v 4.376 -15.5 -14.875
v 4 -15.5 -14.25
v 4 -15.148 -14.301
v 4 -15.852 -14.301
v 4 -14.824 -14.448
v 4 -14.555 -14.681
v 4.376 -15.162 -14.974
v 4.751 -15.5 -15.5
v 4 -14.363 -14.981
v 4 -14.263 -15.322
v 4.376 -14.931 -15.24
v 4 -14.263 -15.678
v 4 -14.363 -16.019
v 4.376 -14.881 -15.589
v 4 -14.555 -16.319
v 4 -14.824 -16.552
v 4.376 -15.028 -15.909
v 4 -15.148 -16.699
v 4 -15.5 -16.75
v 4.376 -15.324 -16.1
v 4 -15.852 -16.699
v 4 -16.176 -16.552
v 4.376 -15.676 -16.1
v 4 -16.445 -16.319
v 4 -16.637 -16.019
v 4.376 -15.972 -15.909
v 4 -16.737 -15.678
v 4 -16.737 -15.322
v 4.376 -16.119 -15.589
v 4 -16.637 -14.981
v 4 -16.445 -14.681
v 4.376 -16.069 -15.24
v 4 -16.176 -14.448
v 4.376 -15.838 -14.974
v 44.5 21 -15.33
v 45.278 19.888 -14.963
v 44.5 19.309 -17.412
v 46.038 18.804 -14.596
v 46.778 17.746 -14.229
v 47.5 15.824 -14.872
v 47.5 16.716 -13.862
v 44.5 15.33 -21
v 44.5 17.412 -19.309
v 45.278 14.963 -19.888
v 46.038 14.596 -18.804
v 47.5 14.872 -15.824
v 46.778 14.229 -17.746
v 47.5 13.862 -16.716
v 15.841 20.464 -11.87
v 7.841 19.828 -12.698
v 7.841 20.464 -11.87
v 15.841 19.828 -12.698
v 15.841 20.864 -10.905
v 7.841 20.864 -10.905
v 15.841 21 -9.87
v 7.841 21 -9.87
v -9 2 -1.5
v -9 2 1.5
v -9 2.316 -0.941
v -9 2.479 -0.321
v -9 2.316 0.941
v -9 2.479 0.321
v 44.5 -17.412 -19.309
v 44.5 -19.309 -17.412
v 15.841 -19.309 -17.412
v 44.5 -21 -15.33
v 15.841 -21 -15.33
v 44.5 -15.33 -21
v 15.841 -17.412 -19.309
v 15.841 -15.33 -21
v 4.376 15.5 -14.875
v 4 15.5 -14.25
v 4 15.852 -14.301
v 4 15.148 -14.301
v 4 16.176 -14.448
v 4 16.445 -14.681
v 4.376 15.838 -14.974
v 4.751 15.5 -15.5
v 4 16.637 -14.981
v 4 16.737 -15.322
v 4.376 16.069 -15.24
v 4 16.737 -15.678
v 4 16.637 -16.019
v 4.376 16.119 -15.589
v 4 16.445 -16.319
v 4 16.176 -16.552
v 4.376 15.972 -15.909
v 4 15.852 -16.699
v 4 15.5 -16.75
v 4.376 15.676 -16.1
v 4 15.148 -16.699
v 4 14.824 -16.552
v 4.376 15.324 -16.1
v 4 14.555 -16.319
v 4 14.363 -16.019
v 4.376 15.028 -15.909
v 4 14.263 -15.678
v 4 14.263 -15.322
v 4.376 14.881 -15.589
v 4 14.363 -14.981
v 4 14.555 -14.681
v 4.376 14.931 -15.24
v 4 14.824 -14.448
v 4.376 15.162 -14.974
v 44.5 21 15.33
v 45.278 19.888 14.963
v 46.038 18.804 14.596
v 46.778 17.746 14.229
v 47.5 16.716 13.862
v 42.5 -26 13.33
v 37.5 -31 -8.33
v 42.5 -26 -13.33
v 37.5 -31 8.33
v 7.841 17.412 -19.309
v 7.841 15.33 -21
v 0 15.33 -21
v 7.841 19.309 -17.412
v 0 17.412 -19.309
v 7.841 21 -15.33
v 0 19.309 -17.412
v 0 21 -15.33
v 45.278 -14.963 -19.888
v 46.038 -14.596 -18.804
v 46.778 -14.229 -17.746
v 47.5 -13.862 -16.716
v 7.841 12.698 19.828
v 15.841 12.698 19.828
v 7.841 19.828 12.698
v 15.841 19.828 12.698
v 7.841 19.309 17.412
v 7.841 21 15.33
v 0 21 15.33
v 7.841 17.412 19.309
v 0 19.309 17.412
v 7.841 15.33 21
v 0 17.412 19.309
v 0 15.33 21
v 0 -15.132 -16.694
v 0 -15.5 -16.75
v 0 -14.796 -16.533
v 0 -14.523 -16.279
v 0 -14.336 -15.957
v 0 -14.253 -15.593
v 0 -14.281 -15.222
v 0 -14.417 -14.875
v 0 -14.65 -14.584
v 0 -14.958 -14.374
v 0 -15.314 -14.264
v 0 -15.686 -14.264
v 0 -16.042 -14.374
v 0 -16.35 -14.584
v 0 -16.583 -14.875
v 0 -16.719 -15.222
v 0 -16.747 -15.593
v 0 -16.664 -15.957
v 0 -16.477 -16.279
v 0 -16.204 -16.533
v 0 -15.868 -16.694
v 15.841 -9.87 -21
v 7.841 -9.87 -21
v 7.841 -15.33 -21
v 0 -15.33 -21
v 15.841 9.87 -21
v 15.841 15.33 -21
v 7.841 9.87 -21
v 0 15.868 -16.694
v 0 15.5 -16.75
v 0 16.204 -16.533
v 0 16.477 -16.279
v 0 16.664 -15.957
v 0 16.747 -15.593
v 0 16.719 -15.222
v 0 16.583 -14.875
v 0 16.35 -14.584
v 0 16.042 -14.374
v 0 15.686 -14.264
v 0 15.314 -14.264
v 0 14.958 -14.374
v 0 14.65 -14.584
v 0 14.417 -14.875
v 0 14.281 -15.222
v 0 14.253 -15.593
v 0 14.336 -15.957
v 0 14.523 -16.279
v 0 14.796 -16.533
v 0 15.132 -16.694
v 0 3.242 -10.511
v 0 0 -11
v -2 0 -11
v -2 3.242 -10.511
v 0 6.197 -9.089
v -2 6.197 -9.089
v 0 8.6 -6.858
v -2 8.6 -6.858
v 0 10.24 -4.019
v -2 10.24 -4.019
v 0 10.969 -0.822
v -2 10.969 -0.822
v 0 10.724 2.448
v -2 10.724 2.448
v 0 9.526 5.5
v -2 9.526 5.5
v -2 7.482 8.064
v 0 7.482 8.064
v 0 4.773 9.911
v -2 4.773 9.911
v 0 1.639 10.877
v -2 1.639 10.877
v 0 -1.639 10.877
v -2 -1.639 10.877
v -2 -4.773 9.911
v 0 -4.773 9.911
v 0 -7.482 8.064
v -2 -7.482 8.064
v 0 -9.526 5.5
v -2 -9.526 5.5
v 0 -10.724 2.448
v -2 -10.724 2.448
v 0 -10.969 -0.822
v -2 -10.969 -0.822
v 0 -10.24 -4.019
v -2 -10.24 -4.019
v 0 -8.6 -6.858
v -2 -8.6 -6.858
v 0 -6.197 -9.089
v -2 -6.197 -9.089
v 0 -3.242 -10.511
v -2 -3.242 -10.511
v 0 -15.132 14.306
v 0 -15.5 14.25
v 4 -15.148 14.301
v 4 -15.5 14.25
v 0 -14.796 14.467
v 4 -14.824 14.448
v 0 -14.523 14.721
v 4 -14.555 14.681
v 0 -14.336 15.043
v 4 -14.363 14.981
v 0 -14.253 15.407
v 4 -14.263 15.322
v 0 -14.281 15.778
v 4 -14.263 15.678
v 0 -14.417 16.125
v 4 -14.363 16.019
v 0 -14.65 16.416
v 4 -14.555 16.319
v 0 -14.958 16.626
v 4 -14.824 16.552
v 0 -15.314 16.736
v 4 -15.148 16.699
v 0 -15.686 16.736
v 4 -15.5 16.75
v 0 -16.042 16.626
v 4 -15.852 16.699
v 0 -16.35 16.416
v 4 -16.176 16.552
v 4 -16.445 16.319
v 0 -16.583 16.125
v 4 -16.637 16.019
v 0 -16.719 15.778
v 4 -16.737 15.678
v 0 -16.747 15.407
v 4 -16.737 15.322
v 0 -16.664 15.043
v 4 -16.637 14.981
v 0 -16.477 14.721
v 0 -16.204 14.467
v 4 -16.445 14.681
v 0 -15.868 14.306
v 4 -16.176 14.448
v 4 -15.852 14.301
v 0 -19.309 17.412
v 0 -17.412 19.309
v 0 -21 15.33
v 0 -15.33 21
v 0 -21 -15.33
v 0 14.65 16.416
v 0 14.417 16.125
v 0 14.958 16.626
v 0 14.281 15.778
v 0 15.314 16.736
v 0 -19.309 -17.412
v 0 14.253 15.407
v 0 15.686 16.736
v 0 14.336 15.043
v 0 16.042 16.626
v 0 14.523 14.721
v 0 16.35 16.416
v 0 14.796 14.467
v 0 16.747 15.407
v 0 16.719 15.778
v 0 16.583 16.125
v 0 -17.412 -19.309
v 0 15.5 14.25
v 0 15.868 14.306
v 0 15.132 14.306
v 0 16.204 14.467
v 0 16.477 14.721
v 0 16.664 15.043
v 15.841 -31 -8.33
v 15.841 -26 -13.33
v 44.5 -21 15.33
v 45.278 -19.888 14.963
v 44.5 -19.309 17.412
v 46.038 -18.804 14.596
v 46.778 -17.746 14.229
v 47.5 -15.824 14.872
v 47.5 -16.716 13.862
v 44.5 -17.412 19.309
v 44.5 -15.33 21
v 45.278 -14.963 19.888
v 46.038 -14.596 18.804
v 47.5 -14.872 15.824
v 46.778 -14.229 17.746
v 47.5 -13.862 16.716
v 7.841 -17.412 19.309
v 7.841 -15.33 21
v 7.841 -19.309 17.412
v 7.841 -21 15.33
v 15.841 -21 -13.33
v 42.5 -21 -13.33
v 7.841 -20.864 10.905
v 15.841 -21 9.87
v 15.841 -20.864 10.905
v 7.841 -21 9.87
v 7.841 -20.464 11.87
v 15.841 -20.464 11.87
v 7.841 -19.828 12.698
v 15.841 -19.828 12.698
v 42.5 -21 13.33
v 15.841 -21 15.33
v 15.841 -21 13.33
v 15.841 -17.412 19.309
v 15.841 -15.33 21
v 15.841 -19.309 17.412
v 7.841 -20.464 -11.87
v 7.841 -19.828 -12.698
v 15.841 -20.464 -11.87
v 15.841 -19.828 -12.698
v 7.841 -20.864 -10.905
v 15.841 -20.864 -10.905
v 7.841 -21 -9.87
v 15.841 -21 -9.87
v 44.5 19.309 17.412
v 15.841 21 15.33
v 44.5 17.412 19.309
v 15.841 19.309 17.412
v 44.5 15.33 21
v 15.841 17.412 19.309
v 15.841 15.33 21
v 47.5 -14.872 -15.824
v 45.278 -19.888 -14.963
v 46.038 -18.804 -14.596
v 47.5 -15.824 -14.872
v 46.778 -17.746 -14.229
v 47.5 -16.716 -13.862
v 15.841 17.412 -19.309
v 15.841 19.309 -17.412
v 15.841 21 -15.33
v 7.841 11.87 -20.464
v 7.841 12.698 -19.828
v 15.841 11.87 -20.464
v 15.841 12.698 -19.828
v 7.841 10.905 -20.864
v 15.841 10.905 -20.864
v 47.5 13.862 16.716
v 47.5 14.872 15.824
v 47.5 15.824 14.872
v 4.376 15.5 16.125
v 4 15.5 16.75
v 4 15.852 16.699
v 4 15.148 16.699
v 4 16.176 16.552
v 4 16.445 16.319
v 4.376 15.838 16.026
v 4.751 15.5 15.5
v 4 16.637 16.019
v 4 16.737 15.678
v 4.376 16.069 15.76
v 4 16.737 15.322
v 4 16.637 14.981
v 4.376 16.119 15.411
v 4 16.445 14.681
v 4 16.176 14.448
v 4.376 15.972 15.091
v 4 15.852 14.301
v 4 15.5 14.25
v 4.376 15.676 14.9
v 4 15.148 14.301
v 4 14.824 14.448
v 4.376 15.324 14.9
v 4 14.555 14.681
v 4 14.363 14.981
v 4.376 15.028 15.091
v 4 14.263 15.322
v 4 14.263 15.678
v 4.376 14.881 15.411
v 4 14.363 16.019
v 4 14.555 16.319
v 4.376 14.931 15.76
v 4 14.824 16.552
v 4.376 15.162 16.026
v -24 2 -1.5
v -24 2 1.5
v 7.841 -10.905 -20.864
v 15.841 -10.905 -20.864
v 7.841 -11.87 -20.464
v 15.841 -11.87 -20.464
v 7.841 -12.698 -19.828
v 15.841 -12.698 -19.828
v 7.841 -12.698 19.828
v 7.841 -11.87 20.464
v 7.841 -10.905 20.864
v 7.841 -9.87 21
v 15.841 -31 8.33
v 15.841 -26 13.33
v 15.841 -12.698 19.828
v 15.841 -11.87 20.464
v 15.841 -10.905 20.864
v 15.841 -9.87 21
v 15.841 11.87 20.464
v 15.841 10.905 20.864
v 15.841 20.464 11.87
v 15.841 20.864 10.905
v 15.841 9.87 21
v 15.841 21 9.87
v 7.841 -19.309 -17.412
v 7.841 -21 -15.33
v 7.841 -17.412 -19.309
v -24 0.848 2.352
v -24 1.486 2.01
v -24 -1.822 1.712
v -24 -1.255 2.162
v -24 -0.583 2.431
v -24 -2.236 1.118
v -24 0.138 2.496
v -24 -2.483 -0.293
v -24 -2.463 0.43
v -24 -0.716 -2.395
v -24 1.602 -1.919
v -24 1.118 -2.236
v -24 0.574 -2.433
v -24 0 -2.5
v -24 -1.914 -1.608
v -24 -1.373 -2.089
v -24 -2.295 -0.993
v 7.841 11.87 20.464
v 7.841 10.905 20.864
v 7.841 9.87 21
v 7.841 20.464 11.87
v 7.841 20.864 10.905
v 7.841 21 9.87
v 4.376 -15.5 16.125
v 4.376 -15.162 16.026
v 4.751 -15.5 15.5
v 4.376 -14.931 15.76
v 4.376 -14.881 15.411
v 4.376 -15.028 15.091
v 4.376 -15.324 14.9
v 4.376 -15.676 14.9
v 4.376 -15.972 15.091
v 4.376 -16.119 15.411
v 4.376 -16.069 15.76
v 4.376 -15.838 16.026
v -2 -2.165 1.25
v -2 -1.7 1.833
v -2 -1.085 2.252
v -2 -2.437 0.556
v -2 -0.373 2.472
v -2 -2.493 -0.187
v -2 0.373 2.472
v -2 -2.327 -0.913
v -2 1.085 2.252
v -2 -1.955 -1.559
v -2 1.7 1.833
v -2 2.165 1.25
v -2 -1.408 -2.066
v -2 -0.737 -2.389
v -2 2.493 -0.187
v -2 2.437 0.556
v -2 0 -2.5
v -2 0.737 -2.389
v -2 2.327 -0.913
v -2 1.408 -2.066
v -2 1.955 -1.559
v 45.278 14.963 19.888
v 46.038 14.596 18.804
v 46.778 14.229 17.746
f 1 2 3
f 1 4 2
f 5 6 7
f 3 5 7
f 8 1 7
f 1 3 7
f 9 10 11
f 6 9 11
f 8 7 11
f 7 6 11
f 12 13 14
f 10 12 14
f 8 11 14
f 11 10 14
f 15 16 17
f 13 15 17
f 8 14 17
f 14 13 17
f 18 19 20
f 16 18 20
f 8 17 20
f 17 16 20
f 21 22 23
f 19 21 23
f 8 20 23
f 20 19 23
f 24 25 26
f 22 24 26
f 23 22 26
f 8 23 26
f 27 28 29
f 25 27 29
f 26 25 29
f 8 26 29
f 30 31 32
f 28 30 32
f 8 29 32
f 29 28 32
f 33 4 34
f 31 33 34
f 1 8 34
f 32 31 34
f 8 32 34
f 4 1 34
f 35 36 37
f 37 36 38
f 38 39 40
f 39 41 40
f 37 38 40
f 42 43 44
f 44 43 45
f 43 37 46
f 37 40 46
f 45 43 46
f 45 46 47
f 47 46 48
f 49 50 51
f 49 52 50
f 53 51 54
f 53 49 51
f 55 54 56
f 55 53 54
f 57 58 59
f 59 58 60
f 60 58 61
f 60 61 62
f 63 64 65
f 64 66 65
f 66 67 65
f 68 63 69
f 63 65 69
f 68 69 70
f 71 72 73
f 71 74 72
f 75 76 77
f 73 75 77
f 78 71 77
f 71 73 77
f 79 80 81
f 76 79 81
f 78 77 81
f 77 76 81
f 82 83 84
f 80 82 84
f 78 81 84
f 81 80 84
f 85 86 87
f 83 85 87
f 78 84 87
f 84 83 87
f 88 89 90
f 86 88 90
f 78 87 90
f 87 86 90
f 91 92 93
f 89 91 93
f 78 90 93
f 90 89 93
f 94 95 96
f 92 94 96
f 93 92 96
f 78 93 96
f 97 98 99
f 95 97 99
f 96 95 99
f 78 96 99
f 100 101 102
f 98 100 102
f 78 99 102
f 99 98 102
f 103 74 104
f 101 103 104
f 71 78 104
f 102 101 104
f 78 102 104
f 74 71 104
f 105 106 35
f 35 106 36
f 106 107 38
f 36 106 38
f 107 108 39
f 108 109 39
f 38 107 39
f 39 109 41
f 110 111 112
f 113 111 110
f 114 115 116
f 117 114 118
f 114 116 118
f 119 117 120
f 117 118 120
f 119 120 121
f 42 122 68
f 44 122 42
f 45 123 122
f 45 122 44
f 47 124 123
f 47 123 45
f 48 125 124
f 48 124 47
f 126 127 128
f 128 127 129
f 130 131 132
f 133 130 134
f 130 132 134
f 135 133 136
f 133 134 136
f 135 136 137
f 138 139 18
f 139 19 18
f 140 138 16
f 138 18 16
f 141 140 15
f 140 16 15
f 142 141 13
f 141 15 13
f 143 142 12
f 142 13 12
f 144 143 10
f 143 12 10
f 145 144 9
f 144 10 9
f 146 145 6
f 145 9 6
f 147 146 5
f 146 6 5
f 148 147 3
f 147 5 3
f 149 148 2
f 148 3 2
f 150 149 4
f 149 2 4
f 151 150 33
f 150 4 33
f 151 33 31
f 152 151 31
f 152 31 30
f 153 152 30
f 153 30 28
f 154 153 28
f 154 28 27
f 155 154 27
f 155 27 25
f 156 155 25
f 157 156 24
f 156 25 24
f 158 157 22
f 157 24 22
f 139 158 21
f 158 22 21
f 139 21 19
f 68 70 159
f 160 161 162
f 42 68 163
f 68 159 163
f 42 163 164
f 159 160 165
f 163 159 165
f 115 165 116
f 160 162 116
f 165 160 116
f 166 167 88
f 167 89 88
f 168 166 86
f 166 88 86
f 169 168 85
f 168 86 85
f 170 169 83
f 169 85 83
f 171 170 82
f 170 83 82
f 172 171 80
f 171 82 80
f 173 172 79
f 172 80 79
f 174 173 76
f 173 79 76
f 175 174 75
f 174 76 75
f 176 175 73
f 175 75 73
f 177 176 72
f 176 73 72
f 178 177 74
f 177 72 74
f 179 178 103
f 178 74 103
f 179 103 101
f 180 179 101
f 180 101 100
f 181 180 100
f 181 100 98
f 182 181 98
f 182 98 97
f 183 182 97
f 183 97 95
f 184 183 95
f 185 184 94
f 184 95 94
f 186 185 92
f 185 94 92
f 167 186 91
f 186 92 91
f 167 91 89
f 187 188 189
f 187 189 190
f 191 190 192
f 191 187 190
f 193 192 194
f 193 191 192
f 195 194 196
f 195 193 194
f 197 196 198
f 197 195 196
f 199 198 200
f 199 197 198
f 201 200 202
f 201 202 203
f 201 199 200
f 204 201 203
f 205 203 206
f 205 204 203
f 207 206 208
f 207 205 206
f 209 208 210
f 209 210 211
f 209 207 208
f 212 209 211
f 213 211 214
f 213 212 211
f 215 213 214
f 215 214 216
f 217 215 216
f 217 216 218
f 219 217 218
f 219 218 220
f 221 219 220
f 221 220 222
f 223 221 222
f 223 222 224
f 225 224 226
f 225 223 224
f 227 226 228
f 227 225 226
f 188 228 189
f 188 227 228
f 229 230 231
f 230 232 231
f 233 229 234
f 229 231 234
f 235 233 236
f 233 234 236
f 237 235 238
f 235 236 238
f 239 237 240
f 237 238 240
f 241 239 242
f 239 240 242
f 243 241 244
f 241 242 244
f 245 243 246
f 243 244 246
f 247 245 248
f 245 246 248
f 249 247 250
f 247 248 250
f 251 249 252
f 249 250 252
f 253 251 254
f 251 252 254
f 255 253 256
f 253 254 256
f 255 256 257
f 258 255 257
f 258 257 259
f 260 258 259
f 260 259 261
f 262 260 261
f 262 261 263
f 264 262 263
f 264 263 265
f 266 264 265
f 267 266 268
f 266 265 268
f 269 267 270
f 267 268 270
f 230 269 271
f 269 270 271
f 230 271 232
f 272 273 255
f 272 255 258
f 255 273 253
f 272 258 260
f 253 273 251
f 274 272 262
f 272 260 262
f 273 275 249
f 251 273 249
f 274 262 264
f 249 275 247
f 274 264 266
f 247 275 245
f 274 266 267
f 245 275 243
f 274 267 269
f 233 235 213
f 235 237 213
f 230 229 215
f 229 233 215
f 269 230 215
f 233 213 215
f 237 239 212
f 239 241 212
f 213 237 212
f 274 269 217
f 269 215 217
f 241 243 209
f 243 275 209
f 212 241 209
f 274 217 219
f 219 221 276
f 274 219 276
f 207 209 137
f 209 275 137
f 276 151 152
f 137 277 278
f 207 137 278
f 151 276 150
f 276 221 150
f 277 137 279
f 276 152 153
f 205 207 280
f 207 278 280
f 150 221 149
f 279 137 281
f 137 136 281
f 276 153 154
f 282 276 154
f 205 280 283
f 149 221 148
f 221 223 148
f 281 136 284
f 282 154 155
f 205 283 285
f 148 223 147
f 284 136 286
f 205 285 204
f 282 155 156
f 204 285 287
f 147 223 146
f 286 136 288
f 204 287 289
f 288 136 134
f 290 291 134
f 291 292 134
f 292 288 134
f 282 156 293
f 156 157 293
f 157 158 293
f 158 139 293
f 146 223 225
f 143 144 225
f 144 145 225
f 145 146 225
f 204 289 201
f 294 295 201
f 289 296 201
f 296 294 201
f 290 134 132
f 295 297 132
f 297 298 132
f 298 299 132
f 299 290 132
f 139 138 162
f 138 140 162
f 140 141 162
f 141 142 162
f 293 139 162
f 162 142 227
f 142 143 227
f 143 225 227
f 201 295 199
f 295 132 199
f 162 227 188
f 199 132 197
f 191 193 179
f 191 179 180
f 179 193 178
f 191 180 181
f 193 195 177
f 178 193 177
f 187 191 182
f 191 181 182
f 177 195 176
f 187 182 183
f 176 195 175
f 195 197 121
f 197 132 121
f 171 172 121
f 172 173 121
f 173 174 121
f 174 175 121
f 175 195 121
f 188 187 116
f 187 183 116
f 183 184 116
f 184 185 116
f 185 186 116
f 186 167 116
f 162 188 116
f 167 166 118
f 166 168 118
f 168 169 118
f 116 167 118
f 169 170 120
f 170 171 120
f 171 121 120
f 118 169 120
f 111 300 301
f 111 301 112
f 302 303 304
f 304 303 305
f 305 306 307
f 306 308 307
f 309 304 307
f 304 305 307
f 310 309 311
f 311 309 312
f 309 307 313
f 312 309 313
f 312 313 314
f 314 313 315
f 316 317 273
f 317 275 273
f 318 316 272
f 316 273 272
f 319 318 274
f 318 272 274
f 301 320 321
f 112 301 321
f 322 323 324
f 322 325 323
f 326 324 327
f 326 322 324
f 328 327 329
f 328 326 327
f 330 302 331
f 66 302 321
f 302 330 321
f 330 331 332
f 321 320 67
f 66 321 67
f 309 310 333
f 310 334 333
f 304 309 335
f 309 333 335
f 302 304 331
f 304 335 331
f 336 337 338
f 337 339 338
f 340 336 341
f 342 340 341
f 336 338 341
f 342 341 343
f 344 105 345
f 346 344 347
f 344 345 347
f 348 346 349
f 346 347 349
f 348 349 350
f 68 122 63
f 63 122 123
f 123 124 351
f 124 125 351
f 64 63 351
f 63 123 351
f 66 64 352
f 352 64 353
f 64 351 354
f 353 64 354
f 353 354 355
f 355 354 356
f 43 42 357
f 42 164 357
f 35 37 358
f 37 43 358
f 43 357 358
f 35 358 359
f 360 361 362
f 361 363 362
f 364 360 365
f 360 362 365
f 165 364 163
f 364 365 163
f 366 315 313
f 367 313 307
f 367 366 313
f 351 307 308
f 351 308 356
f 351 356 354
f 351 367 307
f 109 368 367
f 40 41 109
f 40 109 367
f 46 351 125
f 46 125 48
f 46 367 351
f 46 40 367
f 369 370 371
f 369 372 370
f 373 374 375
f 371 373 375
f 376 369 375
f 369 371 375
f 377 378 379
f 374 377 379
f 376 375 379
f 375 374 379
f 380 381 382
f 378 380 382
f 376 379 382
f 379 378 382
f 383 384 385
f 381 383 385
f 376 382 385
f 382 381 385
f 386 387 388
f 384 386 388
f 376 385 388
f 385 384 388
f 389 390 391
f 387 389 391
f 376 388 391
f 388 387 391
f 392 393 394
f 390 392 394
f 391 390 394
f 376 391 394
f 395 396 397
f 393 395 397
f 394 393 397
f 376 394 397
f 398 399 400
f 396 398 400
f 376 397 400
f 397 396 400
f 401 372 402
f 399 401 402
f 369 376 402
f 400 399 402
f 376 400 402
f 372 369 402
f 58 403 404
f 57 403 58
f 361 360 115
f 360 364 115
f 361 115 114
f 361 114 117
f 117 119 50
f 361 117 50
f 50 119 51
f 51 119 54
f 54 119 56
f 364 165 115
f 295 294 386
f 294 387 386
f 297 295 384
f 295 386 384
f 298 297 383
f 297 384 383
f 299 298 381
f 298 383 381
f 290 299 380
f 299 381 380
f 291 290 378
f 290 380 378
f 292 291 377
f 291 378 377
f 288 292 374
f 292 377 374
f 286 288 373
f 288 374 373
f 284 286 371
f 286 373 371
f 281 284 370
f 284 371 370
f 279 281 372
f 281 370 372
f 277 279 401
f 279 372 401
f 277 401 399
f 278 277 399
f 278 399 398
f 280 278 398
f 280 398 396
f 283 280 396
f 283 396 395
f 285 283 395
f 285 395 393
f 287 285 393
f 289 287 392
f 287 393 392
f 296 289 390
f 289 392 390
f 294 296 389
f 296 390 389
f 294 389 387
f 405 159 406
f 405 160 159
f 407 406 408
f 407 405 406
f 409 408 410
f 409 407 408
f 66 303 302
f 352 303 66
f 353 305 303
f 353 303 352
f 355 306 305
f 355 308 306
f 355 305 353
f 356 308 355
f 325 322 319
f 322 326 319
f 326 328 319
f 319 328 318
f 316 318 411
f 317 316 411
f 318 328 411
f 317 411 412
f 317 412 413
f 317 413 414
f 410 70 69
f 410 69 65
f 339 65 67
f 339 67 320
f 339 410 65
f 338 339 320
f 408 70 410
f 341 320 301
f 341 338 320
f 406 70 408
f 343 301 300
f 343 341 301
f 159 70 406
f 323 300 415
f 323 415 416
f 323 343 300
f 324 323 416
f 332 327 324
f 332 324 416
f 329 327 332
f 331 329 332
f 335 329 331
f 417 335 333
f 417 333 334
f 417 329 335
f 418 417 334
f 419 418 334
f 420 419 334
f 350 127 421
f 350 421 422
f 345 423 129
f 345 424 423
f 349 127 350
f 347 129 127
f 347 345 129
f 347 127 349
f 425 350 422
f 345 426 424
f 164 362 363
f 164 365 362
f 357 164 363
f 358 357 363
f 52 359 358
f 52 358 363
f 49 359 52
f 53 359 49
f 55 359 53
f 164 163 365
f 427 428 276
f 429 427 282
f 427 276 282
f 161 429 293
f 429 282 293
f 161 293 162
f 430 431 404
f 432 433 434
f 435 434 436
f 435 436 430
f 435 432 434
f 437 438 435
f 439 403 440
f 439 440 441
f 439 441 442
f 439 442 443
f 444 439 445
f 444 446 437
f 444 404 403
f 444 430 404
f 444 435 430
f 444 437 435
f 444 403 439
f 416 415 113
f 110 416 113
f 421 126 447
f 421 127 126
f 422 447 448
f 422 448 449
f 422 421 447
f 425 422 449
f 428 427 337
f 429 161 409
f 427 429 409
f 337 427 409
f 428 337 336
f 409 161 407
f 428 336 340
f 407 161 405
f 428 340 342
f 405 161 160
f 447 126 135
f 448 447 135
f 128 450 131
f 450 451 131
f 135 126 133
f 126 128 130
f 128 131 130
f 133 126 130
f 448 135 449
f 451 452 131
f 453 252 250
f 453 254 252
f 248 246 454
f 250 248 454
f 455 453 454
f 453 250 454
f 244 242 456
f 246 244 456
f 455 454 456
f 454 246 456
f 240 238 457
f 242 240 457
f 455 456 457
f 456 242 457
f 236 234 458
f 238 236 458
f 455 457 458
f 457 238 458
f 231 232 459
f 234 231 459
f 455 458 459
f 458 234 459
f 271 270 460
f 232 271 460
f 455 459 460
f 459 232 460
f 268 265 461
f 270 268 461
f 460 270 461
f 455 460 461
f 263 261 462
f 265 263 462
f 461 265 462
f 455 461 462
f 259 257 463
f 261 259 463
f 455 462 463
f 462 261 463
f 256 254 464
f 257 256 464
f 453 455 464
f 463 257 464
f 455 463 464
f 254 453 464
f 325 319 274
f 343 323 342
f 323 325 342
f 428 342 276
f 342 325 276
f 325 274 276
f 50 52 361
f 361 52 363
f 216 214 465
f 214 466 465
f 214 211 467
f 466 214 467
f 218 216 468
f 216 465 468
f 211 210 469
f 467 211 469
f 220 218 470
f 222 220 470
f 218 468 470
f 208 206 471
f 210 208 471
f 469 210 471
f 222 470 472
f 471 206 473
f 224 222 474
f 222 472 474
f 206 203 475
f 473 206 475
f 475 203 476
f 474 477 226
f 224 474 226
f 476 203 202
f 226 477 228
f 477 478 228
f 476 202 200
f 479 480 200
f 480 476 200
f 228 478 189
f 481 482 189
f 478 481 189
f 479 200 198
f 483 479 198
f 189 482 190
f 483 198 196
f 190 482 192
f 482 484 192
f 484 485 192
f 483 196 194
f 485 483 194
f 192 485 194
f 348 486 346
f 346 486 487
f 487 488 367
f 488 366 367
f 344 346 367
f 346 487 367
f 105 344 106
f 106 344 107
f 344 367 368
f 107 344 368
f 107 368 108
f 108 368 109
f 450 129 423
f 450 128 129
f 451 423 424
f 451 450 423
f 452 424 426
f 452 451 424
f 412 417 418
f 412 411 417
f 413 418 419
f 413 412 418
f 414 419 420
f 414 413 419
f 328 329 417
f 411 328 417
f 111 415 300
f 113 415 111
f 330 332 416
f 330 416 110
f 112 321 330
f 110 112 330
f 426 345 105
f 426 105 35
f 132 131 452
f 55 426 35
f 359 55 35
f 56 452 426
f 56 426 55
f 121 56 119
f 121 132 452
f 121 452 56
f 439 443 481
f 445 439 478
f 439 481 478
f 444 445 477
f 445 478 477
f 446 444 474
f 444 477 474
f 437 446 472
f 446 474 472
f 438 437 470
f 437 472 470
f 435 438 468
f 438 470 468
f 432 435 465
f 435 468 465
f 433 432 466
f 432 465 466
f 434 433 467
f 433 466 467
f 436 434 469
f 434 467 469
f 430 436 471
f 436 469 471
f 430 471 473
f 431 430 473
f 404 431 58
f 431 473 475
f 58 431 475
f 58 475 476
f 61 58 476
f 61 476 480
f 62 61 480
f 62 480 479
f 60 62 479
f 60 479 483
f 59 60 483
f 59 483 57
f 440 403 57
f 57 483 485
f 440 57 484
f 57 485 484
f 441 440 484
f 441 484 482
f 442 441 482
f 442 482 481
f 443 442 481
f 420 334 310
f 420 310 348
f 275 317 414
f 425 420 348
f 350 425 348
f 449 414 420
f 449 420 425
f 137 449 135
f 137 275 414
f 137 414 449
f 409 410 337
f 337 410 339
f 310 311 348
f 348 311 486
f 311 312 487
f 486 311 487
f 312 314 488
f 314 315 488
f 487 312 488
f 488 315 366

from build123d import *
from OCP.BRepFilletAPI import BRepFilletAPI_MakeChamfer

# Parameters (mm, degrees)
ESQUISSE1_W                  = 42
ESQUISSE1_H                  = 42
BOSS_EXTRU_1_DEPTH           = 47.5
ESQUISSE2_R                  = 11
BOSS_EXTRU_2_DEPTH           = 2
ESQUISSE3_R                  = 2.5
BOSS_EXTRU_3_DEPTH           = 24
TROU_TARAUD_M31_D            = 2.5
TROU_TARAUD_M31_DEPTH        = 4
TROU_TARAUD_M31_TIP          = 0.751075774
ESQUISSE6_OUTSIDE_W          = 62.59
ESQUISSE6_OUTSIDE_H          = 62.59
ESQUISSE6_OUTSIDE_R          = 26
ENL_V_MAT_EXTRU_1_DEPTH      = 57.020085684
ENL_V_MAT_EXTRU_2_DEPTH      = 57.020085684
ENL_V_MAT_EXTRU_2_DEPTH_BACK = 57.020085684
CHANFREIN1_SIZE              = 3
CHANFREIN1_SIZE2             = 4.28444402
ESQUISSE10_W                 = 26.659419434
ESQUISSE10_H                 = 26.659419434
BOSS_EXTRU_5_DEPTH           = 10
CHANFREIN2_SIZE              = 5
ESQUISSE11_OUTSIDE_W         = 63.576
ESQUISSE11_OUTSIDE_H         = 73.576
ENL_V_MAT_EXTRU_3_DEPTH      = 8
CONG_1_R                     = 4


with BuildPart() as part:
    # Esquisse1 → Boss.-Extru.1 (new body)
    with BuildSketch(Plane(origin=(0, 0, 0), x_dir=(0, 0, -1), z_dir=(1, 0, 0))):
        Rectangle(ESQUISSE1_W, ESQUISSE1_H)
    extrude(amount=BOSS_EXTRU_1_DEPTH)

    # Esquisse2 → Boss.-Extru.2 (add)
    with BuildSketch(Plane(origin=(0, 0, 0), x_dir=(0, 0, -1), z_dir=(1, 0, 0))):
        Circle(ESQUISSE2_R)
    extrude(amount=-BOSS_EXTRU_2_DEPTH)

    # Esquisse3 → Boss.-Extru.3 (add)
    with BuildSketch(Plane.ZY):
        with Locations(Location((0, 0, 0), (0, 0, 180))):
            Circle(ESQUISSE3_R)
    extrude(amount=BOSS_EXTRU_3_DEPTH)

    # Trou taraudé M31
    with Locations(Plane.ZY):
        with Locations((-15.5, 15.5), (15.5, 15.5), (-15.5, -15.5), (15.5, -15.5)):
            Hole(TROU_TARAUD_M31_D / 2, depth=TROU_TARAUD_M31_DEPTH)
            with Locations((0, 0, -(TROU_TARAUD_M31_DEPTH + TROU_TARAUD_M31_TIP / 2))):  # 118° drill point
                Cone(0, TROU_TARAUD_M31_D / 2, TROU_TARAUD_M31_TIP, mode=Mode.SUBTRACT)

    # Esquisse6 outside → Enlèv. mat.-Extru.1 (cut, through all)
    with BuildSketch(Plane(origin=(0, 0, 0), x_dir=(0, 0, -1), z_dir=(1, 0, 0))):
        Rectangle(ESQUISSE6_OUTSIDE_W, ESQUISSE6_OUTSIDE_H)
        Circle(ESQUISSE6_OUTSIDE_R, mode=Mode.SUBTRACT)
    extrude(amount=ENL_V_MAT_EXTRU_1_DEPTH, mode=Mode.SUBTRACT)

    # Esquisse7 → Enlèv. mat.-Extru.2 (cut, two sides: drawn at the far end of the back side and taken through both)
    with BuildSketch(Plane.XY.offset(-ENL_V_MAT_EXTRU_2_DEPTH_BACK)):
        Polygon((-184.216510411, 2), (-24, 2), (-9, 2), (-9, 2.5), (-9, 162.716510411), (-225.598714738, 398.856972015), (-400.815225149, 238.140461604), align=None)
    extrude(amount=ENL_V_MAT_EXTRU_2_DEPTH + ENL_V_MAT_EXTRU_2_DEPTH_BACK, mode=Mode.SUBTRACT)

    # Chanfrein1: one chamfer whose edges measure the first distance from different faces: ONE call of the kernel's chamfer builder (chamfer() names one face for all edges)
    chanfrein1_edges_1 = [part.edges().sort_by_distance(p)[0] for p in [
        (47.5, 0, 21),
    ]]
    chanfrein1_side_1 = [part.faces().sort_by_distance(p)[0] for p in [
        (23.75, 0, 21),
    ]]
    chanfrein1_edges_2 = [part.edges().sort_by_distance(p)[0] for p in [
        (47.5, -21, 0),
    ]]
    chanfrein1_side_2 = [part.faces().sort_by_distance(p)[0] for p in [
        (23.75, -21, 0),
    ]]
    chanfrein1_edges_3 = [part.edges().sort_by_distance(p)[0] for p in [
        (47.5, 0, -21),
    ]]
    chanfrein1_side_3 = [part.faces().sort_by_distance(p)[0] for p in [
        (23.75, 0, -21),
    ]]
    chanfrein1_edges_4 = [part.edges().sort_by_distance(p)[0] for p in [
        (47.5, 21, 0),
    ]]
    chanfrein1_side_4 = [part.faces().sort_by_distance(p)[0] for p in [
        (23.75, 21, 0),
    ]]
    chanfrein1_edges_5 = [part.edges().sort_by_distance(p)[0] for p in [
        (47.5, -18.384776311, 18.384776311),
    ]]
    chanfrein1_side_5 = [part.faces().sort_by_distance(p)[0] for p in [
        (23.75, -18.384776311, 18.384776311),
    ]]
    chanfrein1_edges_6 = [part.edges().sort_by_distance(p)[0] for p in [
        (47.5, 18.384776311, 18.384776311),
    ]]
    chanfrein1_side_6 = [part.faces().sort_by_distance(p)[0] for p in [
        (23.75, 18.384776311, 18.384776311),
    ]]
    chanfrein1_edges_7 = [part.edges().sort_by_distance(p)[0] for p in [
        (47.5, -18.384776311, -18.384776311),
    ]]
    chanfrein1_side_7 = [part.faces().sort_by_distance(p)[0] for p in [
        (23.75, -18.384776311, -18.384776311),
    ]]
    chanfrein1_edges_8 = [part.edges().sort_by_distance(p)[0] for p in [
        (47.5, 18.384776311, -18.384776311),
    ]]
    chanfrein1_side_8 = [part.faces().sort_by_distance(p)[0] for p in [
        (23.75, 18.384776311, -18.384776311),
    ]]
    chanfrein1 = BRepFilletAPI_MakeChamfer(part.part.solid().wrapped)
    for e in chanfrein1_edges_1:
        chanfrein1.Add(CHANFREIN1_SIZE, CHANFREIN1_SIZE2, e.wrapped, chanfrein1_side_1[0].wrapped)  # the first distance lies on this face
    for e in chanfrein1_edges_2:
        chanfrein1.Add(CHANFREIN1_SIZE, CHANFREIN1_SIZE2, e.wrapped, chanfrein1_side_2[0].wrapped)  # the first distance lies on this face
    for e in chanfrein1_edges_3:
        chanfrein1.Add(CHANFREIN1_SIZE, CHANFREIN1_SIZE2, e.wrapped, chanfrein1_side_3[0].wrapped)  # the first distance lies on this face
    for e in chanfrein1_edges_4:
        chanfrein1.Add(CHANFREIN1_SIZE, CHANFREIN1_SIZE2, e.wrapped, chanfrein1_side_4[0].wrapped)  # the first distance lies on this face
    for e in chanfrein1_edges_5:
        chanfrein1.Add(CHANFREIN1_SIZE, CHANFREIN1_SIZE2, e.wrapped, chanfrein1_side_5[0].wrapped)  # the first distance lies on this face
    for e in chanfrein1_edges_6:
        chanfrein1.Add(CHANFREIN1_SIZE, CHANFREIN1_SIZE2, e.wrapped, chanfrein1_side_6[0].wrapped)  # the first distance lies on this face
    for e in chanfrein1_edges_7:
        chanfrein1.Add(CHANFREIN1_SIZE, CHANFREIN1_SIZE2, e.wrapped, chanfrein1_side_7[0].wrapped)  # the first distance lies on this face
    for e in chanfrein1_edges_8:
        chanfrein1.Add(CHANFREIN1_SIZE, CHANFREIN1_SIZE2, e.wrapped, chanfrein1_side_8[0].wrapped)  # the first distance lies on this face
    add(Compound.cast(chanfrein1.Shape()), mode=Mode.REPLACE)

    # Esquisse10 → Boss.-Extru.5 (add)
    with BuildSketch(Plane.XZ.offset(21)):
        with Locations((29.170290283, 0)):
            Rectangle(ESQUISSE10_W, ESQUISSE10_H)
    extrude(amount=BOSS_EXTRU_5_DEPTH)

    # Chanfrein2
    chanfrein2_edges = [part.edges().sort_by_distance(p)[0] for p in [
        (42.5, -31, 0),
        (29.170290283, -31, 13.329709717),
        (29.170290283, -31, -13.329709717),
    ]]
    chamfer(chanfrein2_edges, length=CHANFREIN2_SIZE)

    # Esquisse11 outside → Enlèv. mat.-Extru.3 (cut)
    with BuildSketch(Plane.ZY.offset(-15.840580566)):
        with Locations((0, -5)):
            Rectangle(ESQUISSE11_OUTSIDE_W, ESQUISSE11_OUTSIDE_H)
        Polygon((0, 32.526911935), (-32.526911935, 0), (0, -32.526911935), (32.526911935, 0), align=None, mode=Mode.SUBTRACT)
    extrude(amount=ENL_V_MAT_EXTRU_3_DEPTH, mode=Mode.SUBTRACT)

    # Congé1
    cong_1_edges = [part.edges().sort_by_distance(p)[0] for p in [
        (11.840580566, 21, -11.526911935),
        (11.840580566, 21, 11.526911935),
        (11.840580566, 11.526911935, 21),
        (11.840580566, 11.526911935, -21),
        (11.840580566, -21, -11.526911935),
        (11.840580566, -11.526911935, -21),
        (11.840580566, -21, 11.526911935),
        (11.840580566, -11.526911935, 21),
    ]]
    fillet(cong_1_edges, radius=CONG_1_R)


solid = part.part
